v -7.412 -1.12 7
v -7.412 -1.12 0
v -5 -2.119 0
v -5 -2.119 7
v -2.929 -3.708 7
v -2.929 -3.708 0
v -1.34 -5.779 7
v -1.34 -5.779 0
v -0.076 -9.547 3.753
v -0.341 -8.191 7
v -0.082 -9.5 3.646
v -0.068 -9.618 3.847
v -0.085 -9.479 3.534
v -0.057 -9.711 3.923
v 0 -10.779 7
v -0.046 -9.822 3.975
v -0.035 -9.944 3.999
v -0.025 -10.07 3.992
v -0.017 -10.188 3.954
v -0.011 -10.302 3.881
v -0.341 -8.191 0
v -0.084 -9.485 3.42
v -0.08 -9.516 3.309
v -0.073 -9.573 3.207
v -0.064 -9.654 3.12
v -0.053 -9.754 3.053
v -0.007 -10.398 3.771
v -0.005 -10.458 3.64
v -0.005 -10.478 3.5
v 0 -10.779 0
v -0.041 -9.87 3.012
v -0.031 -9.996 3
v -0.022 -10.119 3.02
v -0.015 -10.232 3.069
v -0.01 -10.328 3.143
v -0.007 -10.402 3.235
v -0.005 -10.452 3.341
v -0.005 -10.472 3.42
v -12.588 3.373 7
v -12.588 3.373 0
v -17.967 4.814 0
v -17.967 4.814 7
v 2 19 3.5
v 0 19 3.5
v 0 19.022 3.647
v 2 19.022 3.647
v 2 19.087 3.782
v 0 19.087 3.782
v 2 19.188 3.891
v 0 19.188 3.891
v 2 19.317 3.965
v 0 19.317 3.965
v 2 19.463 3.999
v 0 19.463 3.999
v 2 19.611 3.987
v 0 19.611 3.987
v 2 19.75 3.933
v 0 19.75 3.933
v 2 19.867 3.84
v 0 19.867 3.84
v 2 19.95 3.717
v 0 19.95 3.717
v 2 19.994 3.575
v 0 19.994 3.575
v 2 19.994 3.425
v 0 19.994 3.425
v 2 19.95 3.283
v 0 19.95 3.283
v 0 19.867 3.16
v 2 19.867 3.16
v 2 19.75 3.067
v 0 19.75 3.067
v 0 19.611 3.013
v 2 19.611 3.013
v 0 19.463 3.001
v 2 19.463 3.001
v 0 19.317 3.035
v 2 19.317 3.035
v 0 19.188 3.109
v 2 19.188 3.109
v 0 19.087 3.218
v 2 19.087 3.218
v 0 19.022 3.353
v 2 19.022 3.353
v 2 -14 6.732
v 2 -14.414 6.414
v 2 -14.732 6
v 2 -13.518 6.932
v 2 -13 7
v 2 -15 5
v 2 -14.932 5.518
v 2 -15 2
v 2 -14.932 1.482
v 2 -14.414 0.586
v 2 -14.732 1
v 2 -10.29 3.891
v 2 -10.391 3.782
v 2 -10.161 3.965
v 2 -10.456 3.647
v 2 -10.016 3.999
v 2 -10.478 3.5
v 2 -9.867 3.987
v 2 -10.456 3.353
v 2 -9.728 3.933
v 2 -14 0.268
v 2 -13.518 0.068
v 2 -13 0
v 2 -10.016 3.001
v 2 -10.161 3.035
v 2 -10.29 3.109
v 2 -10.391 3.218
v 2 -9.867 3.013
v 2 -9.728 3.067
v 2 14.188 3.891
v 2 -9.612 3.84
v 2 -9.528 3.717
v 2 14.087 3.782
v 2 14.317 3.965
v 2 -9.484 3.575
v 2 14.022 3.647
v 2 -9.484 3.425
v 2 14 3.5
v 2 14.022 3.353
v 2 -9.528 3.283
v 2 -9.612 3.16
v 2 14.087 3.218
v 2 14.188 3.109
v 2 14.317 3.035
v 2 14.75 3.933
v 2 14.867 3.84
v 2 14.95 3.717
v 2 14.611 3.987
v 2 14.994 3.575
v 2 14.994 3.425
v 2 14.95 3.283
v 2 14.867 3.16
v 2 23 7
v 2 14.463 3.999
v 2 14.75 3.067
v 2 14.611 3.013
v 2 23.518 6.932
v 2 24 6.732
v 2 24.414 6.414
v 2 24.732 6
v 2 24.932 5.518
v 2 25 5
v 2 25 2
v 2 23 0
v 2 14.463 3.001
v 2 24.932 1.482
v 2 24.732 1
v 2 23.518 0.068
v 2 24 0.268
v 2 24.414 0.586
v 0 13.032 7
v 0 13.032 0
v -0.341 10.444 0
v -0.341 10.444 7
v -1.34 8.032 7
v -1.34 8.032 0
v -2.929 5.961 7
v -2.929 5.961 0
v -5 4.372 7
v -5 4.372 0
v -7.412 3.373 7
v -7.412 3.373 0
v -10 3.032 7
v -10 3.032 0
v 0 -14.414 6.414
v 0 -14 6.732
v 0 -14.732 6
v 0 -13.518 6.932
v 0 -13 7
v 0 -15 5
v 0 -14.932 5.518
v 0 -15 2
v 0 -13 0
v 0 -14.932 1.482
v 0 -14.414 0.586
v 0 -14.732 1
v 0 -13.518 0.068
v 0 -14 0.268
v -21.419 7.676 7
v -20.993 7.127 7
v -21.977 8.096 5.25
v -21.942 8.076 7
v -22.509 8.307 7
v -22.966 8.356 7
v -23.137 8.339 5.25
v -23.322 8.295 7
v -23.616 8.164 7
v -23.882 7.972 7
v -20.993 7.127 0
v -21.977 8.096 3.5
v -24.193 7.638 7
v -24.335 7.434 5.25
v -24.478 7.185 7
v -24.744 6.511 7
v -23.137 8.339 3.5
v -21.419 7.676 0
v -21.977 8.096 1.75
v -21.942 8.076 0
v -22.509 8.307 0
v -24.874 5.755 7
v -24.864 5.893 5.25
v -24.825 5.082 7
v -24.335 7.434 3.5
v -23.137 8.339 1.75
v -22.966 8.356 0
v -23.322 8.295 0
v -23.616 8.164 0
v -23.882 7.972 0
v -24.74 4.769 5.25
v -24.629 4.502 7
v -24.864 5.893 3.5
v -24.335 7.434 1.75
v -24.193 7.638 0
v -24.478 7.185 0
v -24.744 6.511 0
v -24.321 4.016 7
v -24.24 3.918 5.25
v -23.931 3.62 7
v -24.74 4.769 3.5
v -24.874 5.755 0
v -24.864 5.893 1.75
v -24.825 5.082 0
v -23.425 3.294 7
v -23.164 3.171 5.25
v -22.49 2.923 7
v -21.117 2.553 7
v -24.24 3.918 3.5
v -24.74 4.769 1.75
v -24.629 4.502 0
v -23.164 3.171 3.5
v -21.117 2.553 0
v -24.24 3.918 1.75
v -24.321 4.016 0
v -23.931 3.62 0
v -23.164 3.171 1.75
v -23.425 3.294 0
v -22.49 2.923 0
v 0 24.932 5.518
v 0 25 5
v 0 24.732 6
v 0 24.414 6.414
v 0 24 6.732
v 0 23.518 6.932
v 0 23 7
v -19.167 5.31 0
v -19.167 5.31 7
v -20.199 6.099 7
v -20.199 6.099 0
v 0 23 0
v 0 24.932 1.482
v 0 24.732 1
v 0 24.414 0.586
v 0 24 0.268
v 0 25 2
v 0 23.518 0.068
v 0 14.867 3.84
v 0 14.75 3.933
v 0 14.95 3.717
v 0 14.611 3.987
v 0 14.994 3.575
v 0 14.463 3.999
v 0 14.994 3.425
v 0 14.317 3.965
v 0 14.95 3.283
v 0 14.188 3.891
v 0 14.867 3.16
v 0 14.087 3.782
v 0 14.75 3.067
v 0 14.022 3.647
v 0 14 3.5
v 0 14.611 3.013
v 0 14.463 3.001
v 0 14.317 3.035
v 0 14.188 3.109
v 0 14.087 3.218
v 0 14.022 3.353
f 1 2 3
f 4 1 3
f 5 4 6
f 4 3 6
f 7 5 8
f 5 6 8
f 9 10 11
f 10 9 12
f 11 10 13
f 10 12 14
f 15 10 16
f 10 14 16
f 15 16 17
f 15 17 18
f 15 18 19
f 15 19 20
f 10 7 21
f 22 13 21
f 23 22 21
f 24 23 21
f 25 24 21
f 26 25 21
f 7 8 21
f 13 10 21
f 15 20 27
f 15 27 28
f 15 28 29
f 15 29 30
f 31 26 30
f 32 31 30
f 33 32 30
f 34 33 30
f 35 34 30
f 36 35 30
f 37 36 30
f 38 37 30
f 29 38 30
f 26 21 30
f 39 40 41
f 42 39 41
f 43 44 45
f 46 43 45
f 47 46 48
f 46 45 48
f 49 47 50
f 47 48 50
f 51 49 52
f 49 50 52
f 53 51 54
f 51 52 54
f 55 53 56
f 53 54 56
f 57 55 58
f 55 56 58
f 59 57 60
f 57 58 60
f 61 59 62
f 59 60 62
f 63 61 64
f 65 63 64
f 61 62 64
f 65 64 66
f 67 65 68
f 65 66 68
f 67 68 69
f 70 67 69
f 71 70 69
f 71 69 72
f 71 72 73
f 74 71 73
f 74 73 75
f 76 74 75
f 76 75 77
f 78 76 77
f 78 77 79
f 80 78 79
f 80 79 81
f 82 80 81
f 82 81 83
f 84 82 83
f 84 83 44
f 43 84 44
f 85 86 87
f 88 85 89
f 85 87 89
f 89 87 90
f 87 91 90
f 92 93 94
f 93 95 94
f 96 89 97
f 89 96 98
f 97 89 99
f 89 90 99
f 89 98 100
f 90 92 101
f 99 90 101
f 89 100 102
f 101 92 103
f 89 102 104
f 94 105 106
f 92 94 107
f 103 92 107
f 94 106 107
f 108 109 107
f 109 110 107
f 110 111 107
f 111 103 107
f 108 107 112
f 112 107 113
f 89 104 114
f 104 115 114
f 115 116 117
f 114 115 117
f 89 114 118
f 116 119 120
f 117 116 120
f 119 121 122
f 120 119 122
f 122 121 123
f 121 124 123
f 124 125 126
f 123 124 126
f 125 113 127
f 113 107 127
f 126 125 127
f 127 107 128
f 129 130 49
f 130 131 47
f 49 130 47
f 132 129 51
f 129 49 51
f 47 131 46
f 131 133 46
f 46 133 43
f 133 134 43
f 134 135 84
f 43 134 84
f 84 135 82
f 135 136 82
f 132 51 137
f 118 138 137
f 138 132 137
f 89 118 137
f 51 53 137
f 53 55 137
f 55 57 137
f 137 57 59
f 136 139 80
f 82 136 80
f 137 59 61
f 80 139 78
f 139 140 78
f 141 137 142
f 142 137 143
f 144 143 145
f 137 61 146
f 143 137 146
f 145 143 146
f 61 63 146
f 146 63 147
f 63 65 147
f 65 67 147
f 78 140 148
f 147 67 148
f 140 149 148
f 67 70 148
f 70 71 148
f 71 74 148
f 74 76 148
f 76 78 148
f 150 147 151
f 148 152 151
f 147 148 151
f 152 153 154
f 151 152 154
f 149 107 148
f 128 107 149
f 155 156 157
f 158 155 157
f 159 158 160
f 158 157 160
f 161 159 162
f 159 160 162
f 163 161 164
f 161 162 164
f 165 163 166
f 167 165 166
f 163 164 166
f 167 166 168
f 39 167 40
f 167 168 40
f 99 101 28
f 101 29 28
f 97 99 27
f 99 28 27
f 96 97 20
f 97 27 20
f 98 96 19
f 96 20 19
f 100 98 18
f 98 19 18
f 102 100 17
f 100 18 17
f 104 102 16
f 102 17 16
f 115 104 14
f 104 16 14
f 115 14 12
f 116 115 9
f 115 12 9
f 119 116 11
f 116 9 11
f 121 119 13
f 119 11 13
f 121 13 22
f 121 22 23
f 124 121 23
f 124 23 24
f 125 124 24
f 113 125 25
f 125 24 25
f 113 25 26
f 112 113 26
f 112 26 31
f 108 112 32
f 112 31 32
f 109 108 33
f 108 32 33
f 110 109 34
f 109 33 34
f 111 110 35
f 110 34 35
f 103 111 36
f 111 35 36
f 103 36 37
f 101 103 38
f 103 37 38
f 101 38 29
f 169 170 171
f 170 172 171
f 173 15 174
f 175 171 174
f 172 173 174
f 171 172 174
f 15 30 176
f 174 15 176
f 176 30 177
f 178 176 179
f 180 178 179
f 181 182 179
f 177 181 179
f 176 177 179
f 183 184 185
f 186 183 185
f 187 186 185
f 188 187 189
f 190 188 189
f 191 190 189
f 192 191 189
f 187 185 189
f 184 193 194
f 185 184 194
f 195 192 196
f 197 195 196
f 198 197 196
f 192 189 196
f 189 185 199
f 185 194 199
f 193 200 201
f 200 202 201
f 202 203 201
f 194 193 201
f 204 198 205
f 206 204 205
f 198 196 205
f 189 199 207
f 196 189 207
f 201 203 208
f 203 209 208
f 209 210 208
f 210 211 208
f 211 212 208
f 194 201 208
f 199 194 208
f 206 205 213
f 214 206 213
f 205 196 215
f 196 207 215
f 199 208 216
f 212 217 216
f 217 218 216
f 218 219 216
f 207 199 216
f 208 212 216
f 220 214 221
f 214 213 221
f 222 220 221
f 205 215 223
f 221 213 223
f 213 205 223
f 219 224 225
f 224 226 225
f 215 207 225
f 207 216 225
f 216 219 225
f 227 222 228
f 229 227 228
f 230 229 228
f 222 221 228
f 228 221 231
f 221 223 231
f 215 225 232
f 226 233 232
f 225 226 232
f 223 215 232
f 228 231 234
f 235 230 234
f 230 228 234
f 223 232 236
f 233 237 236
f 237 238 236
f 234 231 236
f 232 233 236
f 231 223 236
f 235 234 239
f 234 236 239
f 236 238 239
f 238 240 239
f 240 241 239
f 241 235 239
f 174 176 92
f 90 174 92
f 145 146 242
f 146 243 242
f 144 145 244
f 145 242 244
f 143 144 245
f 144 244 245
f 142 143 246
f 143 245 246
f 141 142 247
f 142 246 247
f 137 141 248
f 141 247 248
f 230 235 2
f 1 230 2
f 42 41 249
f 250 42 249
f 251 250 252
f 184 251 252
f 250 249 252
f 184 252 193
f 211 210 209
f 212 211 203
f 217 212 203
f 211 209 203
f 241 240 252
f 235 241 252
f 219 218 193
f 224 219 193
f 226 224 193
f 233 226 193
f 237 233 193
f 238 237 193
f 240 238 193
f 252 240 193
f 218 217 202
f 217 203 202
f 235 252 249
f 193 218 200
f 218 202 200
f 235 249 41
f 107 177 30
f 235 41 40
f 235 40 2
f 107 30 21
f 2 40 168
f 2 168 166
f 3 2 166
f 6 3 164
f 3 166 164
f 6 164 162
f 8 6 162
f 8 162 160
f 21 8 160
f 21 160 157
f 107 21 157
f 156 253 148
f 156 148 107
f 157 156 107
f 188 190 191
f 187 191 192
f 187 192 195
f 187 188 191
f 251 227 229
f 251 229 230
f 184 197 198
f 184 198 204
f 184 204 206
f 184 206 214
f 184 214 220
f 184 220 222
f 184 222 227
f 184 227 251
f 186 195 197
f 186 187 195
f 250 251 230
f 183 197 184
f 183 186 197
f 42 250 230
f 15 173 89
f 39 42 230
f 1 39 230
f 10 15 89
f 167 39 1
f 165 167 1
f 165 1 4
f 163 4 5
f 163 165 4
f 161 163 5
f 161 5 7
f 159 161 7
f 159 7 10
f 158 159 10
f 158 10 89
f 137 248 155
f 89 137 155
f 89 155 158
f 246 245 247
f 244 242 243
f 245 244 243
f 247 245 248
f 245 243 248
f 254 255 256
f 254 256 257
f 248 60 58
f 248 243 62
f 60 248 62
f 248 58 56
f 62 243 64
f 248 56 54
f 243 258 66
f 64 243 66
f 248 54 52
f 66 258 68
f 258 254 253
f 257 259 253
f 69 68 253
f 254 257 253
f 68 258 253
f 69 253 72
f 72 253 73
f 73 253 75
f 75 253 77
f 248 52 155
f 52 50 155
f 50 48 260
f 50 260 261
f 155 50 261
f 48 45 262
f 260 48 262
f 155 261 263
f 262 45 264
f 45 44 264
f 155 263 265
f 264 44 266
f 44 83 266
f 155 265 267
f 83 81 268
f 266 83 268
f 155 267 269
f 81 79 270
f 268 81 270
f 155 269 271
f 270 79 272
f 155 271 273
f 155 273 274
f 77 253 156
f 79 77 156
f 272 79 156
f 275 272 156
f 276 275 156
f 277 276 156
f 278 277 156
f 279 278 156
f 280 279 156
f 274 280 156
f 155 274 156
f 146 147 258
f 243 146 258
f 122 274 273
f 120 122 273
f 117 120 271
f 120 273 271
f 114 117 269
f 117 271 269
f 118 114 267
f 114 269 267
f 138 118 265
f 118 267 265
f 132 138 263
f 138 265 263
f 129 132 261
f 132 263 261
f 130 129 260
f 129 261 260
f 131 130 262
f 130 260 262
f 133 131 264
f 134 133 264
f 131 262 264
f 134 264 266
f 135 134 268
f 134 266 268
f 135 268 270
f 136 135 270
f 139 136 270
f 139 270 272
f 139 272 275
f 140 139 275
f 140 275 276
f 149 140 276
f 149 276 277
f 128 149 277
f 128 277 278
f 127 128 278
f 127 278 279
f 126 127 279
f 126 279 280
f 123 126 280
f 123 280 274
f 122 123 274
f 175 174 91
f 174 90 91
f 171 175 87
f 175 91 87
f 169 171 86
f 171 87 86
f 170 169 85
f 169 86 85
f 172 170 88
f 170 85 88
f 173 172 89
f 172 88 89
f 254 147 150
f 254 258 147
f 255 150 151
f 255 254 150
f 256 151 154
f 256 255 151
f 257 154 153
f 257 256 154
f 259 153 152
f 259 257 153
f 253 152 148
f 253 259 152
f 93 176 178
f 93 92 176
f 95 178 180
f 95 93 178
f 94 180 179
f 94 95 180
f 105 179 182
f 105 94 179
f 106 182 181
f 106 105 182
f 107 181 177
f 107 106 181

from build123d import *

# Parameters (mm, degrees)
F1_DEPTH      = 7
F2_R          = 2
F3_R          = 0.5
F4_DEPTH      = 2.0010001
F4_DEPTH_BACK = 24.8789222903


with BuildPart() as f1:
    # F0 (on Top) → F1 (new body)
    with BuildSketch(Plane.XY):
        with BuildLine():
            Line((2, 25), (0, 25))
            Line((0, 25), (0, 13.0322537284))
            ThreePointArc((0, 13.0322537284), (-3.9123857099, 5.0987203255), (-12.588190451, 3.3729954655))
            Line((-12.588190451, 3.3729954655), (-17.9665717036, 4.8141283787))
            ThreePointArc((-17.9665717036, 4.8141283787), (-19.7086801846, 5.6711680458), (-20.9929948561, 7.1271882293))
            add(Edge.make_bspline(
                [(-20.9929948561, 7.1271882293), (-21.4872059239, 7.9756639765), (-23.6615903783, 9.114022363), (-25.2928151043, 5.8433290431), (-24.2888337192, 3.5518281333), (-22.9499167285, 2.9919819486), (-21.1171958686, 2.5525070382)],
                knots=[0.095408387, 0.095408387, 0.095408387, 0.095408387, 0.2784045725, 0.5273569121, 0.7343943929, 1, 1, 1, 1], degree=3))
            Line((-21.1171958686, 2.5525070382), (-7.411809549, -1.1198401581))
            ThreePointArc((-7.411809549, -1.1198401581), (-2.0664665971, -4.6914841309), (0, -10.779098421))
            Line((0, -10.779098421), (0, -15))
            Line((0, -15), (2, -15))
            Line((2, -15), (2, 25))
        make_face()
    extrude(amount=F1_DEPTH)

    # F2
    f2_edges = [f1.edges().sort_by_distance(p)[0] for p in [
        (1, 25, 0),
        (1, 25, 7),
        (1, -15, 0),
        (1, -15, 7),
    ]]
    fillet(f2_edges, radius=F2_R)

    # F3 (on face) → F4 (cut, two sides)
    with BuildSketch(Plane(origin=(0, 0, 0), x_dir=(0, -1, 0), z_dir=(-1, 0, 0))) as f4_sk:
        with Locations((-19.5, 3.5)):
            Circle(F3_R)
        with Locations((-14.5, 3.5)):
            Circle(F3_R)
        with Locations((9.9783017114, 3.5)):
            Circle(F3_R)
    extrude(amount=-F4_DEPTH, mode=Mode.SUBTRACT)
    extrude(f4_sk.sketch, amount=F4_DEPTH_BACK, mode=Mode.SUBTRACT)


solid = f1.part
